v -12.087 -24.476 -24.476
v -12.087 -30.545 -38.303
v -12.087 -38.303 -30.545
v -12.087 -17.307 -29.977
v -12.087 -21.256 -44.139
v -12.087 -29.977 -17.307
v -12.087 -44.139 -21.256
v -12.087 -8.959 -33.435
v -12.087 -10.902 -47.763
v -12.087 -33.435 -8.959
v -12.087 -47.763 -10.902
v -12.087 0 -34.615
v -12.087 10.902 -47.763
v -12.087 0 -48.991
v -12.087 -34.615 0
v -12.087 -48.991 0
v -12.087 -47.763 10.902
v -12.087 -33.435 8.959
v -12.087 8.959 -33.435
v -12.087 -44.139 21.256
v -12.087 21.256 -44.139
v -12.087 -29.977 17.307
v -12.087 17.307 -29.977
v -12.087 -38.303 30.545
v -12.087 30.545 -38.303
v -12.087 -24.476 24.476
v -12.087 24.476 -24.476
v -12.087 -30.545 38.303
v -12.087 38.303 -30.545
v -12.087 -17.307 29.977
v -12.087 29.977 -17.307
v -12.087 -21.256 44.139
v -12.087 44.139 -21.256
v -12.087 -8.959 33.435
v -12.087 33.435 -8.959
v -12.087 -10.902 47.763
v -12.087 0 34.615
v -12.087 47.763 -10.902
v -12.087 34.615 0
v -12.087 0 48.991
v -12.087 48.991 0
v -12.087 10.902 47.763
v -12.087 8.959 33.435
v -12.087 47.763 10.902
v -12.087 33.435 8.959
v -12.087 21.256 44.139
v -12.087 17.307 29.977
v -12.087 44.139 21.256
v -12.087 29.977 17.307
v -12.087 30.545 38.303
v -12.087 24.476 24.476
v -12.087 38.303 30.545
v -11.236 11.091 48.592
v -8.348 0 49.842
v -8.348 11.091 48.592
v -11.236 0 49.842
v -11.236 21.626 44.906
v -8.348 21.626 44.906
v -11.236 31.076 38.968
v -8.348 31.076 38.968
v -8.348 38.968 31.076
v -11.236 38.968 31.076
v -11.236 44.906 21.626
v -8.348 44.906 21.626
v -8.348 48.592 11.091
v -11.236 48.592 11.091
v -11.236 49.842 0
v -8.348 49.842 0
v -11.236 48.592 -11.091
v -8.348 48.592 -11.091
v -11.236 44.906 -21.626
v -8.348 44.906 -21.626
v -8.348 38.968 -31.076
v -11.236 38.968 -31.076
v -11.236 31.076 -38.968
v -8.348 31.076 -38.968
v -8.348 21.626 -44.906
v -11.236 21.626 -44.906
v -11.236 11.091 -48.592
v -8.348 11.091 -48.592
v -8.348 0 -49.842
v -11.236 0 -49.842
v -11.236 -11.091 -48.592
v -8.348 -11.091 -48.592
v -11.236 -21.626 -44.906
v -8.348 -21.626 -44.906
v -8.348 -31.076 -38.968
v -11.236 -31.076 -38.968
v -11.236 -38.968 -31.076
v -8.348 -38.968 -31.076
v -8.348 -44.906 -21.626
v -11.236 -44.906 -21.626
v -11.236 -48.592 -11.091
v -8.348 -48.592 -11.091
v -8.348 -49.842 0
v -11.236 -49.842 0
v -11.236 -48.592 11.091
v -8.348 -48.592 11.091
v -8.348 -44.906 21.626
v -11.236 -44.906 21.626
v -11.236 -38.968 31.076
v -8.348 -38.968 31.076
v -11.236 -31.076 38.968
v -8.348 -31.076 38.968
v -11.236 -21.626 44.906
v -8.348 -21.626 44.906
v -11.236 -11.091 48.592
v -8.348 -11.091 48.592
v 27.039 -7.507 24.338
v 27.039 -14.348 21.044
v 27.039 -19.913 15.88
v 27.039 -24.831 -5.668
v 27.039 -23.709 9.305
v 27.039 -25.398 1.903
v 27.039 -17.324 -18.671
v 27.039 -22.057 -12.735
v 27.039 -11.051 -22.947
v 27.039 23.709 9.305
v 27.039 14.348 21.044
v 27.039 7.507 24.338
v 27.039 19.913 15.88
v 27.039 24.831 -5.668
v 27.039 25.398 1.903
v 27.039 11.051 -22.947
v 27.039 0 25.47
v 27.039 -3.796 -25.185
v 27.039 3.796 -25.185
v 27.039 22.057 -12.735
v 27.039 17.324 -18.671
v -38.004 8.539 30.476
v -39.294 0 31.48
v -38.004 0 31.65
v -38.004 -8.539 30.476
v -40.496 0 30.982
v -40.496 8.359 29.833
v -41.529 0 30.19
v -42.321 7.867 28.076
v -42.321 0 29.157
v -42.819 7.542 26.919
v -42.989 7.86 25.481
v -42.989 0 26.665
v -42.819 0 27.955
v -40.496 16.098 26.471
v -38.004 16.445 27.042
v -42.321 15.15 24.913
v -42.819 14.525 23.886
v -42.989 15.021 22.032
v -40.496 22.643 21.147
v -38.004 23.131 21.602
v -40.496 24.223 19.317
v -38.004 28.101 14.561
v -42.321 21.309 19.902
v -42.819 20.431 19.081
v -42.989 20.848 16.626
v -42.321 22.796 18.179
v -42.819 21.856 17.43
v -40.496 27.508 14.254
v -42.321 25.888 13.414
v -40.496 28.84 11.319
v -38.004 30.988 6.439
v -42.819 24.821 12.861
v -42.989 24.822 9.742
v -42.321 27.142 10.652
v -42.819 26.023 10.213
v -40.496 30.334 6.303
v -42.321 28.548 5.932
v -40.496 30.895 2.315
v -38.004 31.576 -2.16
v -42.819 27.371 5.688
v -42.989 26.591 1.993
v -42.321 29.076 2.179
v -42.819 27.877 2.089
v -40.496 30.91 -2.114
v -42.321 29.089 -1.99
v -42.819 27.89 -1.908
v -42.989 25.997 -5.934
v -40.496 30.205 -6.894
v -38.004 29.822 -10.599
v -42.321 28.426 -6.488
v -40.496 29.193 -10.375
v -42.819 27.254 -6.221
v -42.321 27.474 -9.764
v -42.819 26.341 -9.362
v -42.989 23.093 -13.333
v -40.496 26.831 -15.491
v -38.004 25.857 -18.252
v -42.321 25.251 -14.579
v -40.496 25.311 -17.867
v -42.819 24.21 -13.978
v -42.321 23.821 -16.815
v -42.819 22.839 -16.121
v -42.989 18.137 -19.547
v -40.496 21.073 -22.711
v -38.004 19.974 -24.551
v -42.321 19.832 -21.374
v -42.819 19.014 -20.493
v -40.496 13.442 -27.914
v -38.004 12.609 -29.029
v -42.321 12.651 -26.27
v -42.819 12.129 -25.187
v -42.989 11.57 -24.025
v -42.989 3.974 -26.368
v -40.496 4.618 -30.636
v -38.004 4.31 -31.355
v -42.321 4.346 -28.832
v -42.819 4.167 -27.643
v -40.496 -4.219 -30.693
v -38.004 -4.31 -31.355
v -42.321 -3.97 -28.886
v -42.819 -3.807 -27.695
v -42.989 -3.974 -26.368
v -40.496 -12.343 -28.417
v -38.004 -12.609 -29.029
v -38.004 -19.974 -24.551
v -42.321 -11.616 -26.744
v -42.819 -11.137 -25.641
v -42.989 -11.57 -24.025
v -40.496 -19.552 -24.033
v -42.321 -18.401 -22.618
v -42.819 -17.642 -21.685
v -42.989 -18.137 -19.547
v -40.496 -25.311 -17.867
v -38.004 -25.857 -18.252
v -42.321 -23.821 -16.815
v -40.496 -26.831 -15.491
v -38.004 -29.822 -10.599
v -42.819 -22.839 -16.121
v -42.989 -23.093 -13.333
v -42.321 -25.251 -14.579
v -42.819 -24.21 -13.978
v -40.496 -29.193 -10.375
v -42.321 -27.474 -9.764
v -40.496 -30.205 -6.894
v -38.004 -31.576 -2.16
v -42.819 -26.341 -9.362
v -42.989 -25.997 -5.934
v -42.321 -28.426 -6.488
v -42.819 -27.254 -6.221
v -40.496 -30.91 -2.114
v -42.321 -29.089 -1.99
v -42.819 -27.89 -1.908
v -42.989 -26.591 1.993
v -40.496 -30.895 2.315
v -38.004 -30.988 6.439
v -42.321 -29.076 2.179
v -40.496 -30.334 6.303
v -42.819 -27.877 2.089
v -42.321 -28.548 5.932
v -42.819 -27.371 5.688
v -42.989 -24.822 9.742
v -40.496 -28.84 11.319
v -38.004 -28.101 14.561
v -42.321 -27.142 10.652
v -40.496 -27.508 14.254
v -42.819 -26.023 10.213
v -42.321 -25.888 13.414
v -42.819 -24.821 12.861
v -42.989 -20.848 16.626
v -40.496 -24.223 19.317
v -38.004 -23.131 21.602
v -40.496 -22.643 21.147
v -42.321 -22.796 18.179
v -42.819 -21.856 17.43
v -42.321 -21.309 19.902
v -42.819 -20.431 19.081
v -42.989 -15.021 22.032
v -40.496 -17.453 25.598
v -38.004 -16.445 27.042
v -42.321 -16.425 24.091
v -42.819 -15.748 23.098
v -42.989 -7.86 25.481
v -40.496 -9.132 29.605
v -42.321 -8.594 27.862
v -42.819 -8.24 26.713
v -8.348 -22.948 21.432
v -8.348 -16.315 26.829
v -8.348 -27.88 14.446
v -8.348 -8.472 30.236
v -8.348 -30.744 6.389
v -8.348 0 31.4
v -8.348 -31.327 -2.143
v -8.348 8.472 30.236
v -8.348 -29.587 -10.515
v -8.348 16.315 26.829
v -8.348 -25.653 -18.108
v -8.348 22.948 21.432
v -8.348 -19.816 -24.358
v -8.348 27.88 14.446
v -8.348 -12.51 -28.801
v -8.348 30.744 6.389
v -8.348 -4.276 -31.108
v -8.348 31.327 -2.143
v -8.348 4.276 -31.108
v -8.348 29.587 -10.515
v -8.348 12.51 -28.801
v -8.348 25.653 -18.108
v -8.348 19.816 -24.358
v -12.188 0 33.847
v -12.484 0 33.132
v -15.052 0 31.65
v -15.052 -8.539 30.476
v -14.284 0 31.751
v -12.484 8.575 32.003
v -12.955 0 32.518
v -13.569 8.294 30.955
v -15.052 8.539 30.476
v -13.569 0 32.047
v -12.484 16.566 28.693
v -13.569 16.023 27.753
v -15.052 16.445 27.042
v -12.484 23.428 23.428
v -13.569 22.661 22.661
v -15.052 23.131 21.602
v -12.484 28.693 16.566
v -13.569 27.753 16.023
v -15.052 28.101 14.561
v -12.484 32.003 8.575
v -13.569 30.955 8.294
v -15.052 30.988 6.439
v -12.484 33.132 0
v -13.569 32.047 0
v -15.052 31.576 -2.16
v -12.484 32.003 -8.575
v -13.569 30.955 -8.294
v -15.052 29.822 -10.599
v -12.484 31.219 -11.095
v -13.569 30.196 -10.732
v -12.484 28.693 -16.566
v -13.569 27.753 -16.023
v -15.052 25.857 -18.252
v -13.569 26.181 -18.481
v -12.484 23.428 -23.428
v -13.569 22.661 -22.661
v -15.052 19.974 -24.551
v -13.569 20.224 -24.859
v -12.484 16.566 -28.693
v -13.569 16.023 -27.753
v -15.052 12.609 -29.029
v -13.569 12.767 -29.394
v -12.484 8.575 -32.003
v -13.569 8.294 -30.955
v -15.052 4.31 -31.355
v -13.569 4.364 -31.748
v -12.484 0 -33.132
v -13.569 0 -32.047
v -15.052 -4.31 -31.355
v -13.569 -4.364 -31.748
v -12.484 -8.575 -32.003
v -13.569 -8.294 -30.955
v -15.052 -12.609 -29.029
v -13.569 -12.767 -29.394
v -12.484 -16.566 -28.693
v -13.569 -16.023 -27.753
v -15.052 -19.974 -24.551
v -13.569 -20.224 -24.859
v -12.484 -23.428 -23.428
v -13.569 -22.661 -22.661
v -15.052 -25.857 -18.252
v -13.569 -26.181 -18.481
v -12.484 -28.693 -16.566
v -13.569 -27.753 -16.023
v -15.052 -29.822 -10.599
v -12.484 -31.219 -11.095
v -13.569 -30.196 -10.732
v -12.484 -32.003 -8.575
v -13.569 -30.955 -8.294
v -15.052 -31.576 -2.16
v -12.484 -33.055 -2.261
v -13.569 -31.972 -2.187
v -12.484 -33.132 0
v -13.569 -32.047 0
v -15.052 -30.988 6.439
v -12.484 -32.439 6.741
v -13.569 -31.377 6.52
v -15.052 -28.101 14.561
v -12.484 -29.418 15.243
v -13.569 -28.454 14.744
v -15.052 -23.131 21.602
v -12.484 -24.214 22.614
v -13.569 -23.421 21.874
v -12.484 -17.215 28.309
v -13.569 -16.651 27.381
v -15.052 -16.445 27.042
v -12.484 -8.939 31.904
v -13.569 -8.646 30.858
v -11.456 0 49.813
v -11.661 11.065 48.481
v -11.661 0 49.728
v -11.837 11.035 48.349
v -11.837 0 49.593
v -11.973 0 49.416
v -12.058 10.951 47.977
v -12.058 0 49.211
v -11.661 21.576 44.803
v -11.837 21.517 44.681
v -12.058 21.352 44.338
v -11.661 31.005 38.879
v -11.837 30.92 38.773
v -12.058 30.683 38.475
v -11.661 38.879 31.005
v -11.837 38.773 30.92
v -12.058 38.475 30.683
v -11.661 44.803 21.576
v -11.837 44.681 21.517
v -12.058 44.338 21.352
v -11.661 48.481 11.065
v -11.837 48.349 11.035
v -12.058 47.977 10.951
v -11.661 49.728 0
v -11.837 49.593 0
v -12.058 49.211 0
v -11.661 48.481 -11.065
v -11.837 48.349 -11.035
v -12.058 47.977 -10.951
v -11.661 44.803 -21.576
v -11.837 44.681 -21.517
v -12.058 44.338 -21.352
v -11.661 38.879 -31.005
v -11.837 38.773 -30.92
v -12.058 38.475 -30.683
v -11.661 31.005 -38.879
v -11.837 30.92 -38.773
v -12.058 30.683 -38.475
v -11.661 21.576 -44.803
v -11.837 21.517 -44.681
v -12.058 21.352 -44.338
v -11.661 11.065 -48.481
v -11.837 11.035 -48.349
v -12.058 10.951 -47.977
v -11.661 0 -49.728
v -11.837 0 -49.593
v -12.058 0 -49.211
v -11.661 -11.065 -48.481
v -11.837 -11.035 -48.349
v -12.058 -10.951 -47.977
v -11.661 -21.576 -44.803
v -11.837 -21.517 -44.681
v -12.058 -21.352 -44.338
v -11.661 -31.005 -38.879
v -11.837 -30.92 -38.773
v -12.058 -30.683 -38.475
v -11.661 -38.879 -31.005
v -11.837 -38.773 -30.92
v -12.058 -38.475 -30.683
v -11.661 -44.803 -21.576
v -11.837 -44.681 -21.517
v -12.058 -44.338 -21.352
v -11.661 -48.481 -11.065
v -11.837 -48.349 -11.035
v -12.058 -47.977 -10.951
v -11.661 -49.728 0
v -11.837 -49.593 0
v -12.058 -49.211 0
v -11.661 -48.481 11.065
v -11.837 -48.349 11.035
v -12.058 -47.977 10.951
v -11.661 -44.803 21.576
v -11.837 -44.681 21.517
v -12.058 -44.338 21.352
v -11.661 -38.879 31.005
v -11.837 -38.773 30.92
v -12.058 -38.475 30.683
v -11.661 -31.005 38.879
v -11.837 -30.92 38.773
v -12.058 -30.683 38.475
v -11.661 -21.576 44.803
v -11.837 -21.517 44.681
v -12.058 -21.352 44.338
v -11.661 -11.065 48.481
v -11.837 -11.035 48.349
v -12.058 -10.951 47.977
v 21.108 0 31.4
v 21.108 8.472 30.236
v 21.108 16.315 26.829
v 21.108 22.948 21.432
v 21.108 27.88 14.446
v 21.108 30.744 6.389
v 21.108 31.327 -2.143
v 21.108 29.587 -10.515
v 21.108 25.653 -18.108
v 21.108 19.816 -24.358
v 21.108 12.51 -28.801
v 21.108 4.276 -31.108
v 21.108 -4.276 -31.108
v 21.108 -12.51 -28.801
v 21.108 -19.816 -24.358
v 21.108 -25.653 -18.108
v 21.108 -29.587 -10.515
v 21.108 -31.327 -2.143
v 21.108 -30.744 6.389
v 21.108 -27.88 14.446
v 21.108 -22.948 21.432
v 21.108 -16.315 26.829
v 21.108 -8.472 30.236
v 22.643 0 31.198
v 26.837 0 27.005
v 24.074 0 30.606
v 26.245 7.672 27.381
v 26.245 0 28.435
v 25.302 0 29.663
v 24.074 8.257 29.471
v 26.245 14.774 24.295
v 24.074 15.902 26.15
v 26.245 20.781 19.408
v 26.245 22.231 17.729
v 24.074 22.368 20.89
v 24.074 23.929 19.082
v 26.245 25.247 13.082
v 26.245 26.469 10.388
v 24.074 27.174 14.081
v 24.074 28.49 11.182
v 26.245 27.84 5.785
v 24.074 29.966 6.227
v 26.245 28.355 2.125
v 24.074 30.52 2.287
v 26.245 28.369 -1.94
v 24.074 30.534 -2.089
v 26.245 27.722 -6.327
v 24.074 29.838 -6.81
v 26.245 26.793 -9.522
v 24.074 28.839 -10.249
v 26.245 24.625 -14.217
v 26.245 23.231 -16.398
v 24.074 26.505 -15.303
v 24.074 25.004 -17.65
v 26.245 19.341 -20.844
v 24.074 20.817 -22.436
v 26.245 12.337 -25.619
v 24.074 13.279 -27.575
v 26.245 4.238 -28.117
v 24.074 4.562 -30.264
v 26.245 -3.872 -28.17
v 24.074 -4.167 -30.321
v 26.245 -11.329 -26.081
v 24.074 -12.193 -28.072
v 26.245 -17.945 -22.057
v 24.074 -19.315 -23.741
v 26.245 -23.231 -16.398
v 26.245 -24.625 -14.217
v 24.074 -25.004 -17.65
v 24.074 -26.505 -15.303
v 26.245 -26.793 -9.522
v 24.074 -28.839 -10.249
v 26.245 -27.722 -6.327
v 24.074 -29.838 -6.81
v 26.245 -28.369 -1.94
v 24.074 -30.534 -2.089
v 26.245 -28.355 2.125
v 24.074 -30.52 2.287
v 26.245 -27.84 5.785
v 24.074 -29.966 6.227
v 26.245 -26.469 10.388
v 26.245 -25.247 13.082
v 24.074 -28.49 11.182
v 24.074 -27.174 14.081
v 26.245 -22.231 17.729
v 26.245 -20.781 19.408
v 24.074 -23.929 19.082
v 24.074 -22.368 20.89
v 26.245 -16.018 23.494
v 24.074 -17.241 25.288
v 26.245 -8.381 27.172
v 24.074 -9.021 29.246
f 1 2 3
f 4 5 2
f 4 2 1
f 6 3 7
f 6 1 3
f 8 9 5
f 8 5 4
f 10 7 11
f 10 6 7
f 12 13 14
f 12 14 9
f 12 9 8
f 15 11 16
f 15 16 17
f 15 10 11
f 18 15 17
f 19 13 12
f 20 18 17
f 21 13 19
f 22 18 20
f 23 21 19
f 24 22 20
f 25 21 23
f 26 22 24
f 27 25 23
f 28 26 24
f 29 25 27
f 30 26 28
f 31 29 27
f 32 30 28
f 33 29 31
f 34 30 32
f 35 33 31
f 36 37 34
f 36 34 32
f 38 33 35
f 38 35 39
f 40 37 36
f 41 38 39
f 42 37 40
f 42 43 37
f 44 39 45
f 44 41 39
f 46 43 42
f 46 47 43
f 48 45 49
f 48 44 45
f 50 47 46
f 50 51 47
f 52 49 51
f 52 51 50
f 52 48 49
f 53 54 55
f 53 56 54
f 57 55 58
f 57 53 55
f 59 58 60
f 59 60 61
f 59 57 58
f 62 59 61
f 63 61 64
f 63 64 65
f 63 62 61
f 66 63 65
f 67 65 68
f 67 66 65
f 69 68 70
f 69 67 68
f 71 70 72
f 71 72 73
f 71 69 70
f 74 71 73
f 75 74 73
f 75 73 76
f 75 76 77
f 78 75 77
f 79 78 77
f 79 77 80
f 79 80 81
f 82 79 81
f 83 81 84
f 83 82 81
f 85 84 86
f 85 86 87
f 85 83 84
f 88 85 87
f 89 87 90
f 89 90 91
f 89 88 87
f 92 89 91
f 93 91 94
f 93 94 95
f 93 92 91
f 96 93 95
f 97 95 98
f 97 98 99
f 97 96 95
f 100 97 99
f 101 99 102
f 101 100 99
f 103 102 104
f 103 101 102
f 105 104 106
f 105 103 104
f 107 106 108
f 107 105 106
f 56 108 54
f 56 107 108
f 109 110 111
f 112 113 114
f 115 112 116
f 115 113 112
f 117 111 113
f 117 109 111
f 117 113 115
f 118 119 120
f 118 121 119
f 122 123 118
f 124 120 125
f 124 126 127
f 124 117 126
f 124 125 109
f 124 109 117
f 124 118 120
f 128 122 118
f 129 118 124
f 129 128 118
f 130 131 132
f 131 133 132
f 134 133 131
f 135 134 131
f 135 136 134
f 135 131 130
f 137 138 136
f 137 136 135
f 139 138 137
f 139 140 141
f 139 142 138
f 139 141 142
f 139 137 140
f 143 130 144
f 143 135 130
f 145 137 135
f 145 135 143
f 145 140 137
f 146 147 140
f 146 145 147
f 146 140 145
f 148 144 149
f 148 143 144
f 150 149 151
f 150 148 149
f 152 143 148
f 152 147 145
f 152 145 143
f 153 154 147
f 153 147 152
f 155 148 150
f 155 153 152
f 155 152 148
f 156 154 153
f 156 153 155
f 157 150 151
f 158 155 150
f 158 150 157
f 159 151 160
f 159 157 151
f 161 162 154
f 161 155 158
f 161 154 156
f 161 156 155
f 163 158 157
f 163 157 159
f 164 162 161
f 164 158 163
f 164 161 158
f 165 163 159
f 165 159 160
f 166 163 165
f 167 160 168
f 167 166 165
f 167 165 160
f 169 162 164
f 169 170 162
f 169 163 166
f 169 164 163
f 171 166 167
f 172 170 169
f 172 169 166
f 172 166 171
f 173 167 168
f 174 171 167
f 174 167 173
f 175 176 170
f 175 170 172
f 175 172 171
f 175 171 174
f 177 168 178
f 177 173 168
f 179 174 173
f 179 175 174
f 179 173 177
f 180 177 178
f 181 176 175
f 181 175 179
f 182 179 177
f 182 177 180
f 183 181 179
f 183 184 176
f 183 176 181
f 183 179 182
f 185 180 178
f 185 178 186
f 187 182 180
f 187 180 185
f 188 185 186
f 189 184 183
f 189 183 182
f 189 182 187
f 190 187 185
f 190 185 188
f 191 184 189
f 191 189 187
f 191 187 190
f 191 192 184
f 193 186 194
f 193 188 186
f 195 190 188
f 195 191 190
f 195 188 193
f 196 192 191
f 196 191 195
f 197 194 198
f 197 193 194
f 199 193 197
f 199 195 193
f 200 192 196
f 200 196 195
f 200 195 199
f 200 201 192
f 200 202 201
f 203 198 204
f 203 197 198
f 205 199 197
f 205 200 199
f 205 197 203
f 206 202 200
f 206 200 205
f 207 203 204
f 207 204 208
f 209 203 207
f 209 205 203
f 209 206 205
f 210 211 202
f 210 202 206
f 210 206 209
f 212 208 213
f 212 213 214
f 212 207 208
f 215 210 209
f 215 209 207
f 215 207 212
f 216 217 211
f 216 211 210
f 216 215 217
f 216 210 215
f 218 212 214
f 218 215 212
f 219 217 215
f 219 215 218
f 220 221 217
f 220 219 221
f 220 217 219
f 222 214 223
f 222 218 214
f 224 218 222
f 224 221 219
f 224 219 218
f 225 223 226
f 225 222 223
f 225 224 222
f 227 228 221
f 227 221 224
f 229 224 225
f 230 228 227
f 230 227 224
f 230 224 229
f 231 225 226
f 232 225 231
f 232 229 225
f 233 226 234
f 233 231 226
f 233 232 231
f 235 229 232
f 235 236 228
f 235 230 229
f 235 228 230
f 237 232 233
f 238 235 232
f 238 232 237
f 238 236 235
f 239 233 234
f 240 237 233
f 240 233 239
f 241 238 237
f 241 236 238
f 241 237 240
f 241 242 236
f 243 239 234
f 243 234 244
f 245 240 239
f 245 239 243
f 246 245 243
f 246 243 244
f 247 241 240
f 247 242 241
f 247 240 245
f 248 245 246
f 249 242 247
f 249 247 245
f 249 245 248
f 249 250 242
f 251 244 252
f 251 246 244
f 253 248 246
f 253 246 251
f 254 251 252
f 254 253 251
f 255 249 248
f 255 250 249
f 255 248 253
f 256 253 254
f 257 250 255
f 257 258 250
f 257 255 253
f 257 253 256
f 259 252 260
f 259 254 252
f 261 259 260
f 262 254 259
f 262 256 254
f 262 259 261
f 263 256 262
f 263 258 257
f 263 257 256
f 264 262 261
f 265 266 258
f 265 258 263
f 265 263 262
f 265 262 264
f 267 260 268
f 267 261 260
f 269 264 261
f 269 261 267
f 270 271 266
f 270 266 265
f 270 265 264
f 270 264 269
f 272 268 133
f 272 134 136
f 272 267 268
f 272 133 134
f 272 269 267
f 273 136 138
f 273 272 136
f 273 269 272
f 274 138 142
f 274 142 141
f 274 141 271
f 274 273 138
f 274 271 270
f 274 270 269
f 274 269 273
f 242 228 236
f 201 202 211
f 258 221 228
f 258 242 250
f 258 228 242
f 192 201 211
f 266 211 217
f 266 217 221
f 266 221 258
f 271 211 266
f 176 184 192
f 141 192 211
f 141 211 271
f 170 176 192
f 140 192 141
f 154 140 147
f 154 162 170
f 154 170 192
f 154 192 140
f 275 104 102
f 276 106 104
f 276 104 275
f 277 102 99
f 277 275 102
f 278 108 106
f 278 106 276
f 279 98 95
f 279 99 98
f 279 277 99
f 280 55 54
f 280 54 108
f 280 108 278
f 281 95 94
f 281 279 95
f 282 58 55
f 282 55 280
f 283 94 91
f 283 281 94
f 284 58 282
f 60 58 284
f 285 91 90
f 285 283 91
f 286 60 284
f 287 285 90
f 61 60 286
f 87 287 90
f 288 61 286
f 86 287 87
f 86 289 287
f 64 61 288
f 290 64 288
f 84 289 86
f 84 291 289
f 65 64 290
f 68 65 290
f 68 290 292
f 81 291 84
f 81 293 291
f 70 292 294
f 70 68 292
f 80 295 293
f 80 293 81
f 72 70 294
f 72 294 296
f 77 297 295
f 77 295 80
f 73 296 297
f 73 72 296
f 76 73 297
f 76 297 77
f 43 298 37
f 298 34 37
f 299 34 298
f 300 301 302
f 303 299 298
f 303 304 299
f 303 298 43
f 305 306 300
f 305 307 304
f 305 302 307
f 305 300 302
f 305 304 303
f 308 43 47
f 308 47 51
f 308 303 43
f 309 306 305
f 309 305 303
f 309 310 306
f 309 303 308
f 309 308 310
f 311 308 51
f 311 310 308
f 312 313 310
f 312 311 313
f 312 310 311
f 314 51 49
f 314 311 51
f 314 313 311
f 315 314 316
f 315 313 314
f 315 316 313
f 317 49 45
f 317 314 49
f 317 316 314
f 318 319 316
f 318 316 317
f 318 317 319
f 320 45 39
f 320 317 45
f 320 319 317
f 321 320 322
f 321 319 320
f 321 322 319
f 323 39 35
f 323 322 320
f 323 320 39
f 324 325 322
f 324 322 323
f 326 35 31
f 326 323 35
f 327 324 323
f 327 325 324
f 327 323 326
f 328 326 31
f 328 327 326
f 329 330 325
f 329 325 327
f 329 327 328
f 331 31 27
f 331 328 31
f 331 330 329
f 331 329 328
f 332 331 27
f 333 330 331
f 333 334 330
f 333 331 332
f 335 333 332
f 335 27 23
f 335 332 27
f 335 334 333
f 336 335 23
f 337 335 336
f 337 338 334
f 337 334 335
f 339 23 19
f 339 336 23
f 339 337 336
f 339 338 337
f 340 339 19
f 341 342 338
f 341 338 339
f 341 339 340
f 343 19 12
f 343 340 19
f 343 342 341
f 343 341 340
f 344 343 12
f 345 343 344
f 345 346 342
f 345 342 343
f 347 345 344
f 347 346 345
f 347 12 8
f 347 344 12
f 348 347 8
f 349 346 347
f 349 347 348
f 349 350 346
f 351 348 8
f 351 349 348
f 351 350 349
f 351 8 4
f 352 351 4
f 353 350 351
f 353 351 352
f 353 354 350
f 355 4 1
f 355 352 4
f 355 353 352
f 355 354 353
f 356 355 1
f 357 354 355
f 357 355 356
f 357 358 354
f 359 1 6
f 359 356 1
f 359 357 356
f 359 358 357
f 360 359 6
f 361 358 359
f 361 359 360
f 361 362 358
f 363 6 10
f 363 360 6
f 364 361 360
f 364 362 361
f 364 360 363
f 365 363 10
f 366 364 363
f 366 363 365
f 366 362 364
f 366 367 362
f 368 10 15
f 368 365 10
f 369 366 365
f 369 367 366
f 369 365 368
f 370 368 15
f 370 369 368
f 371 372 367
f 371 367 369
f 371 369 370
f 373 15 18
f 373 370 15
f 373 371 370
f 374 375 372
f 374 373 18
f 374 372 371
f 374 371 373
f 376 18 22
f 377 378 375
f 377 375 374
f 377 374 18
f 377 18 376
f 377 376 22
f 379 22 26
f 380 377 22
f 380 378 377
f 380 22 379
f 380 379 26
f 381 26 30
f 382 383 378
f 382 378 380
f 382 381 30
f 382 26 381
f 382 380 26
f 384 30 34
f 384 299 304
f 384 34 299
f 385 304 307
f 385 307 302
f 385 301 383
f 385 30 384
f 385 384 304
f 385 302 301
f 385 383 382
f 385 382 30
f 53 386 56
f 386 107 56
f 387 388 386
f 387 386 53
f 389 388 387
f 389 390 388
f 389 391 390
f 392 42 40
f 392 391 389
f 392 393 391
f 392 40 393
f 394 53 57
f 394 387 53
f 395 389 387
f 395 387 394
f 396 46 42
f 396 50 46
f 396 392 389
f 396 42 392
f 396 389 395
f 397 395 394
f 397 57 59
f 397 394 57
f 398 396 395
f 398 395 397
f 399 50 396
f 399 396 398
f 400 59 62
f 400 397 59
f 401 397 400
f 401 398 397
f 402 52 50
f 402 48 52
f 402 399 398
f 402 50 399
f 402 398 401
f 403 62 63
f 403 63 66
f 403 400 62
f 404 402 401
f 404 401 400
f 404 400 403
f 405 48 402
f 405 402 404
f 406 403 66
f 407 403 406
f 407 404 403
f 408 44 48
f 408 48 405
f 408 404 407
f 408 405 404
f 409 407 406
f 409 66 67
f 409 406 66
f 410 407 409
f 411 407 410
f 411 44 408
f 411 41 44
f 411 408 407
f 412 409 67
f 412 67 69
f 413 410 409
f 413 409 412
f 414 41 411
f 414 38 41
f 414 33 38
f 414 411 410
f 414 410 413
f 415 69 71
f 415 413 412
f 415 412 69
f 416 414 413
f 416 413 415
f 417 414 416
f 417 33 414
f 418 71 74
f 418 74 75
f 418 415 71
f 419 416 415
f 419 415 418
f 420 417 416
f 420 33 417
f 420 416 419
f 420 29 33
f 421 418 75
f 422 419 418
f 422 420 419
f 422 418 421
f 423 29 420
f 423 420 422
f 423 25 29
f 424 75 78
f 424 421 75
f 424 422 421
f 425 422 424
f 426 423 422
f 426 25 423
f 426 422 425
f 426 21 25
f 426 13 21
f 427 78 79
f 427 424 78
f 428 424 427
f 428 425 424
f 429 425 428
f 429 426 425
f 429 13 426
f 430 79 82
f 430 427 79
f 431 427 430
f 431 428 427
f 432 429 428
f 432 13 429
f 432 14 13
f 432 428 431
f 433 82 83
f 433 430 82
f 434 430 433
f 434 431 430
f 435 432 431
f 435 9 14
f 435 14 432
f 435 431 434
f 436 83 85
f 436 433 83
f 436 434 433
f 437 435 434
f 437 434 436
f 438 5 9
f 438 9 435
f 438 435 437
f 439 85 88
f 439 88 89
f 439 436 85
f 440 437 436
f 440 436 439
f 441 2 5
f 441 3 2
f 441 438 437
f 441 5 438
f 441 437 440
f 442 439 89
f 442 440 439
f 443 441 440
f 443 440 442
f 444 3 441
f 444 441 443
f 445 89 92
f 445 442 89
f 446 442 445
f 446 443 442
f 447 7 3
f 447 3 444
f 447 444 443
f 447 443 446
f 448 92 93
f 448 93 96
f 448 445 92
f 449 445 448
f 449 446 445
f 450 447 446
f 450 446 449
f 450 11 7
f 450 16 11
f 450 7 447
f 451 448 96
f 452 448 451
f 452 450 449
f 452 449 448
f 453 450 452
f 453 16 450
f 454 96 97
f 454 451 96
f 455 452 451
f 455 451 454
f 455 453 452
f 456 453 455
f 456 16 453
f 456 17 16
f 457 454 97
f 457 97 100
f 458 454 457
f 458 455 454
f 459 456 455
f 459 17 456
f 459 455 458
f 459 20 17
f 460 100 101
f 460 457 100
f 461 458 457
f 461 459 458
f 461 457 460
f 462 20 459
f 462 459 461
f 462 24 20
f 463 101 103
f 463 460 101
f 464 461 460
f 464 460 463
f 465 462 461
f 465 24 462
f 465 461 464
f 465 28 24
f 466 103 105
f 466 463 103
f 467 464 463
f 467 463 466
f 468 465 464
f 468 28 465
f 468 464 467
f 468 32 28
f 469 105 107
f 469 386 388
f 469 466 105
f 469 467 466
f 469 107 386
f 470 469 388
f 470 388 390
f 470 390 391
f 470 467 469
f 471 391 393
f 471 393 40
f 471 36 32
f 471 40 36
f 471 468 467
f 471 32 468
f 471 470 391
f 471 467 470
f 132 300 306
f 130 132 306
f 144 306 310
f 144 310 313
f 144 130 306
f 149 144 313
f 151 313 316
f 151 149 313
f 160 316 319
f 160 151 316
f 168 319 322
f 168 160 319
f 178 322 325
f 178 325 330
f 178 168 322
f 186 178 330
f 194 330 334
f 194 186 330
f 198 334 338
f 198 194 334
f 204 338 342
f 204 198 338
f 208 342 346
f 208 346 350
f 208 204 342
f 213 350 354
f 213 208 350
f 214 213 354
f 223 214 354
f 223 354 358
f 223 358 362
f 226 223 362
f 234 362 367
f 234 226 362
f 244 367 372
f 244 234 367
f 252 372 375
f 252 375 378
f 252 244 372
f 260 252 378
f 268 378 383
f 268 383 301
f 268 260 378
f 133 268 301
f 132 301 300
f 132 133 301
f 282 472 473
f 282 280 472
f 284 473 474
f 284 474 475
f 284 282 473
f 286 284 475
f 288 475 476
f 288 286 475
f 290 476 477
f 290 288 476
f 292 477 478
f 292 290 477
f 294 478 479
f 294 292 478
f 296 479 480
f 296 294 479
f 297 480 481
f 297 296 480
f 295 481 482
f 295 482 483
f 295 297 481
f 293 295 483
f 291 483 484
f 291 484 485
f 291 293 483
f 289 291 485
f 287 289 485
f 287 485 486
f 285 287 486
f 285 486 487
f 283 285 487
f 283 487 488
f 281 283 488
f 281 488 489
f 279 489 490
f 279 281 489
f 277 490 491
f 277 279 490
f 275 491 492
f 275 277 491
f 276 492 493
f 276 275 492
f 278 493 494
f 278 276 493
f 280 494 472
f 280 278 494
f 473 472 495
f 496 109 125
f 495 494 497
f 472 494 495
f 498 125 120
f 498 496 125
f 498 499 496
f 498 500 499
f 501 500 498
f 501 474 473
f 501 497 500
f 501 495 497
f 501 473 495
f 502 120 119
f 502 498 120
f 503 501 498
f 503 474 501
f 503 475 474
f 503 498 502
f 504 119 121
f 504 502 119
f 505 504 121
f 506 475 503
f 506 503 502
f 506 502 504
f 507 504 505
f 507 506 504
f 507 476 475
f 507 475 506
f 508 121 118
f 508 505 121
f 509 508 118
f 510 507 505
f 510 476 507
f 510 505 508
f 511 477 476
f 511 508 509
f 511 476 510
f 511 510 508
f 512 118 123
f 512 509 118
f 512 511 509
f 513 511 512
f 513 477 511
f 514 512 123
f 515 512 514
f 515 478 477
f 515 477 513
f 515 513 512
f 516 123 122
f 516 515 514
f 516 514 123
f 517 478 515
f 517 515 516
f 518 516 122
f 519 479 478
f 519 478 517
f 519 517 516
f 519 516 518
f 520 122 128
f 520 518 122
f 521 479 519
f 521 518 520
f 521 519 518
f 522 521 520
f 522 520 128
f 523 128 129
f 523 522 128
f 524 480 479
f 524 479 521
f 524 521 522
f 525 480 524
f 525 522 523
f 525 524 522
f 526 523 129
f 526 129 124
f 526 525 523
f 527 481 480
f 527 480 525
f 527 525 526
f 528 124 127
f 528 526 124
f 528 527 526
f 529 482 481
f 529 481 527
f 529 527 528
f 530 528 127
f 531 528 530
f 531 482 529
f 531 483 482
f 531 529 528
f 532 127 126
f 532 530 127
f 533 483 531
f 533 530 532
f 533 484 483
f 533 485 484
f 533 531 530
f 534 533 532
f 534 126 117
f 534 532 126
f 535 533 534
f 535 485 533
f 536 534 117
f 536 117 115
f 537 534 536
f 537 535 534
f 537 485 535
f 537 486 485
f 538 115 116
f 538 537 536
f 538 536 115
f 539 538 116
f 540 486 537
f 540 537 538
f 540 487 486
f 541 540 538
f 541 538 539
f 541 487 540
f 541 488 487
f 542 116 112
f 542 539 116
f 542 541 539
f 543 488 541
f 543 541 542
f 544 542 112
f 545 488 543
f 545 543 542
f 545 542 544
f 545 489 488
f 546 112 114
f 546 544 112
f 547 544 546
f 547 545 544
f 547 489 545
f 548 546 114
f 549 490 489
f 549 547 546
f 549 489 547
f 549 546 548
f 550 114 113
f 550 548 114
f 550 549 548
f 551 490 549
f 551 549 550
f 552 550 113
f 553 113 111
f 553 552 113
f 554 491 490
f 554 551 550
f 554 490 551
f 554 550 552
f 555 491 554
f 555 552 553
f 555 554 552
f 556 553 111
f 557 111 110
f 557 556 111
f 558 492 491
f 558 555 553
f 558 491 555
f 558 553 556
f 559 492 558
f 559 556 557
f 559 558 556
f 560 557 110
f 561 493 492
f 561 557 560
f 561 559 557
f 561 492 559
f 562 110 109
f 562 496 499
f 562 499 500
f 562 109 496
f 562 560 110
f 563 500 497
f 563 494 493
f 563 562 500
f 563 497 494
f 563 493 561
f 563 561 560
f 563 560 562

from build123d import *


with BuildPart() as f1:
    # F0 (on Front) → F1 (revolve)
    with BuildSketch(Plane.XZ):
        with BuildLine():
            Line((-42.988531, 26.665349), (-42.988531, 0))
            Line((-42.988531, 0), (27.039163, 0))
            Line((27.039163, 0), (27.039163, 25.46965))
            ThreePointArc((27.039163, 25.46965), (25.30211, 29.663266), (21.108494, 31.400319))
            Line((21.108494, 31.400319), (-8.348497, 31.400319))
            Line((-8.348497, 31.400319), (-8.348497, 49.841773))
            Line((-8.348497, 49.841773), (-11.235781, 49.841773))
            ThreePointArc((-11.235781, 49.841773), (-11.837422, 49.592565), (-12.08663, 48.990924))
            Line((-12.08663, 48.990924), (-12.08663, 34.614854))
            ThreePointArc((-12.08663, 34.614854), (-12.955154, 32.518051), (-15.051958, 31.649526))
            Line((-15.051958, 31.649526), (-38.004354, 31.649526))
            ThreePointArc((-38.004354, 31.649526), (-41.528699, 30.189694), (-42.988531, 26.665349))
        make_face()
    revolve(axis=Axis((-7.974684, 0, 0), (-1, 0, 0)))


solid = f1.part
